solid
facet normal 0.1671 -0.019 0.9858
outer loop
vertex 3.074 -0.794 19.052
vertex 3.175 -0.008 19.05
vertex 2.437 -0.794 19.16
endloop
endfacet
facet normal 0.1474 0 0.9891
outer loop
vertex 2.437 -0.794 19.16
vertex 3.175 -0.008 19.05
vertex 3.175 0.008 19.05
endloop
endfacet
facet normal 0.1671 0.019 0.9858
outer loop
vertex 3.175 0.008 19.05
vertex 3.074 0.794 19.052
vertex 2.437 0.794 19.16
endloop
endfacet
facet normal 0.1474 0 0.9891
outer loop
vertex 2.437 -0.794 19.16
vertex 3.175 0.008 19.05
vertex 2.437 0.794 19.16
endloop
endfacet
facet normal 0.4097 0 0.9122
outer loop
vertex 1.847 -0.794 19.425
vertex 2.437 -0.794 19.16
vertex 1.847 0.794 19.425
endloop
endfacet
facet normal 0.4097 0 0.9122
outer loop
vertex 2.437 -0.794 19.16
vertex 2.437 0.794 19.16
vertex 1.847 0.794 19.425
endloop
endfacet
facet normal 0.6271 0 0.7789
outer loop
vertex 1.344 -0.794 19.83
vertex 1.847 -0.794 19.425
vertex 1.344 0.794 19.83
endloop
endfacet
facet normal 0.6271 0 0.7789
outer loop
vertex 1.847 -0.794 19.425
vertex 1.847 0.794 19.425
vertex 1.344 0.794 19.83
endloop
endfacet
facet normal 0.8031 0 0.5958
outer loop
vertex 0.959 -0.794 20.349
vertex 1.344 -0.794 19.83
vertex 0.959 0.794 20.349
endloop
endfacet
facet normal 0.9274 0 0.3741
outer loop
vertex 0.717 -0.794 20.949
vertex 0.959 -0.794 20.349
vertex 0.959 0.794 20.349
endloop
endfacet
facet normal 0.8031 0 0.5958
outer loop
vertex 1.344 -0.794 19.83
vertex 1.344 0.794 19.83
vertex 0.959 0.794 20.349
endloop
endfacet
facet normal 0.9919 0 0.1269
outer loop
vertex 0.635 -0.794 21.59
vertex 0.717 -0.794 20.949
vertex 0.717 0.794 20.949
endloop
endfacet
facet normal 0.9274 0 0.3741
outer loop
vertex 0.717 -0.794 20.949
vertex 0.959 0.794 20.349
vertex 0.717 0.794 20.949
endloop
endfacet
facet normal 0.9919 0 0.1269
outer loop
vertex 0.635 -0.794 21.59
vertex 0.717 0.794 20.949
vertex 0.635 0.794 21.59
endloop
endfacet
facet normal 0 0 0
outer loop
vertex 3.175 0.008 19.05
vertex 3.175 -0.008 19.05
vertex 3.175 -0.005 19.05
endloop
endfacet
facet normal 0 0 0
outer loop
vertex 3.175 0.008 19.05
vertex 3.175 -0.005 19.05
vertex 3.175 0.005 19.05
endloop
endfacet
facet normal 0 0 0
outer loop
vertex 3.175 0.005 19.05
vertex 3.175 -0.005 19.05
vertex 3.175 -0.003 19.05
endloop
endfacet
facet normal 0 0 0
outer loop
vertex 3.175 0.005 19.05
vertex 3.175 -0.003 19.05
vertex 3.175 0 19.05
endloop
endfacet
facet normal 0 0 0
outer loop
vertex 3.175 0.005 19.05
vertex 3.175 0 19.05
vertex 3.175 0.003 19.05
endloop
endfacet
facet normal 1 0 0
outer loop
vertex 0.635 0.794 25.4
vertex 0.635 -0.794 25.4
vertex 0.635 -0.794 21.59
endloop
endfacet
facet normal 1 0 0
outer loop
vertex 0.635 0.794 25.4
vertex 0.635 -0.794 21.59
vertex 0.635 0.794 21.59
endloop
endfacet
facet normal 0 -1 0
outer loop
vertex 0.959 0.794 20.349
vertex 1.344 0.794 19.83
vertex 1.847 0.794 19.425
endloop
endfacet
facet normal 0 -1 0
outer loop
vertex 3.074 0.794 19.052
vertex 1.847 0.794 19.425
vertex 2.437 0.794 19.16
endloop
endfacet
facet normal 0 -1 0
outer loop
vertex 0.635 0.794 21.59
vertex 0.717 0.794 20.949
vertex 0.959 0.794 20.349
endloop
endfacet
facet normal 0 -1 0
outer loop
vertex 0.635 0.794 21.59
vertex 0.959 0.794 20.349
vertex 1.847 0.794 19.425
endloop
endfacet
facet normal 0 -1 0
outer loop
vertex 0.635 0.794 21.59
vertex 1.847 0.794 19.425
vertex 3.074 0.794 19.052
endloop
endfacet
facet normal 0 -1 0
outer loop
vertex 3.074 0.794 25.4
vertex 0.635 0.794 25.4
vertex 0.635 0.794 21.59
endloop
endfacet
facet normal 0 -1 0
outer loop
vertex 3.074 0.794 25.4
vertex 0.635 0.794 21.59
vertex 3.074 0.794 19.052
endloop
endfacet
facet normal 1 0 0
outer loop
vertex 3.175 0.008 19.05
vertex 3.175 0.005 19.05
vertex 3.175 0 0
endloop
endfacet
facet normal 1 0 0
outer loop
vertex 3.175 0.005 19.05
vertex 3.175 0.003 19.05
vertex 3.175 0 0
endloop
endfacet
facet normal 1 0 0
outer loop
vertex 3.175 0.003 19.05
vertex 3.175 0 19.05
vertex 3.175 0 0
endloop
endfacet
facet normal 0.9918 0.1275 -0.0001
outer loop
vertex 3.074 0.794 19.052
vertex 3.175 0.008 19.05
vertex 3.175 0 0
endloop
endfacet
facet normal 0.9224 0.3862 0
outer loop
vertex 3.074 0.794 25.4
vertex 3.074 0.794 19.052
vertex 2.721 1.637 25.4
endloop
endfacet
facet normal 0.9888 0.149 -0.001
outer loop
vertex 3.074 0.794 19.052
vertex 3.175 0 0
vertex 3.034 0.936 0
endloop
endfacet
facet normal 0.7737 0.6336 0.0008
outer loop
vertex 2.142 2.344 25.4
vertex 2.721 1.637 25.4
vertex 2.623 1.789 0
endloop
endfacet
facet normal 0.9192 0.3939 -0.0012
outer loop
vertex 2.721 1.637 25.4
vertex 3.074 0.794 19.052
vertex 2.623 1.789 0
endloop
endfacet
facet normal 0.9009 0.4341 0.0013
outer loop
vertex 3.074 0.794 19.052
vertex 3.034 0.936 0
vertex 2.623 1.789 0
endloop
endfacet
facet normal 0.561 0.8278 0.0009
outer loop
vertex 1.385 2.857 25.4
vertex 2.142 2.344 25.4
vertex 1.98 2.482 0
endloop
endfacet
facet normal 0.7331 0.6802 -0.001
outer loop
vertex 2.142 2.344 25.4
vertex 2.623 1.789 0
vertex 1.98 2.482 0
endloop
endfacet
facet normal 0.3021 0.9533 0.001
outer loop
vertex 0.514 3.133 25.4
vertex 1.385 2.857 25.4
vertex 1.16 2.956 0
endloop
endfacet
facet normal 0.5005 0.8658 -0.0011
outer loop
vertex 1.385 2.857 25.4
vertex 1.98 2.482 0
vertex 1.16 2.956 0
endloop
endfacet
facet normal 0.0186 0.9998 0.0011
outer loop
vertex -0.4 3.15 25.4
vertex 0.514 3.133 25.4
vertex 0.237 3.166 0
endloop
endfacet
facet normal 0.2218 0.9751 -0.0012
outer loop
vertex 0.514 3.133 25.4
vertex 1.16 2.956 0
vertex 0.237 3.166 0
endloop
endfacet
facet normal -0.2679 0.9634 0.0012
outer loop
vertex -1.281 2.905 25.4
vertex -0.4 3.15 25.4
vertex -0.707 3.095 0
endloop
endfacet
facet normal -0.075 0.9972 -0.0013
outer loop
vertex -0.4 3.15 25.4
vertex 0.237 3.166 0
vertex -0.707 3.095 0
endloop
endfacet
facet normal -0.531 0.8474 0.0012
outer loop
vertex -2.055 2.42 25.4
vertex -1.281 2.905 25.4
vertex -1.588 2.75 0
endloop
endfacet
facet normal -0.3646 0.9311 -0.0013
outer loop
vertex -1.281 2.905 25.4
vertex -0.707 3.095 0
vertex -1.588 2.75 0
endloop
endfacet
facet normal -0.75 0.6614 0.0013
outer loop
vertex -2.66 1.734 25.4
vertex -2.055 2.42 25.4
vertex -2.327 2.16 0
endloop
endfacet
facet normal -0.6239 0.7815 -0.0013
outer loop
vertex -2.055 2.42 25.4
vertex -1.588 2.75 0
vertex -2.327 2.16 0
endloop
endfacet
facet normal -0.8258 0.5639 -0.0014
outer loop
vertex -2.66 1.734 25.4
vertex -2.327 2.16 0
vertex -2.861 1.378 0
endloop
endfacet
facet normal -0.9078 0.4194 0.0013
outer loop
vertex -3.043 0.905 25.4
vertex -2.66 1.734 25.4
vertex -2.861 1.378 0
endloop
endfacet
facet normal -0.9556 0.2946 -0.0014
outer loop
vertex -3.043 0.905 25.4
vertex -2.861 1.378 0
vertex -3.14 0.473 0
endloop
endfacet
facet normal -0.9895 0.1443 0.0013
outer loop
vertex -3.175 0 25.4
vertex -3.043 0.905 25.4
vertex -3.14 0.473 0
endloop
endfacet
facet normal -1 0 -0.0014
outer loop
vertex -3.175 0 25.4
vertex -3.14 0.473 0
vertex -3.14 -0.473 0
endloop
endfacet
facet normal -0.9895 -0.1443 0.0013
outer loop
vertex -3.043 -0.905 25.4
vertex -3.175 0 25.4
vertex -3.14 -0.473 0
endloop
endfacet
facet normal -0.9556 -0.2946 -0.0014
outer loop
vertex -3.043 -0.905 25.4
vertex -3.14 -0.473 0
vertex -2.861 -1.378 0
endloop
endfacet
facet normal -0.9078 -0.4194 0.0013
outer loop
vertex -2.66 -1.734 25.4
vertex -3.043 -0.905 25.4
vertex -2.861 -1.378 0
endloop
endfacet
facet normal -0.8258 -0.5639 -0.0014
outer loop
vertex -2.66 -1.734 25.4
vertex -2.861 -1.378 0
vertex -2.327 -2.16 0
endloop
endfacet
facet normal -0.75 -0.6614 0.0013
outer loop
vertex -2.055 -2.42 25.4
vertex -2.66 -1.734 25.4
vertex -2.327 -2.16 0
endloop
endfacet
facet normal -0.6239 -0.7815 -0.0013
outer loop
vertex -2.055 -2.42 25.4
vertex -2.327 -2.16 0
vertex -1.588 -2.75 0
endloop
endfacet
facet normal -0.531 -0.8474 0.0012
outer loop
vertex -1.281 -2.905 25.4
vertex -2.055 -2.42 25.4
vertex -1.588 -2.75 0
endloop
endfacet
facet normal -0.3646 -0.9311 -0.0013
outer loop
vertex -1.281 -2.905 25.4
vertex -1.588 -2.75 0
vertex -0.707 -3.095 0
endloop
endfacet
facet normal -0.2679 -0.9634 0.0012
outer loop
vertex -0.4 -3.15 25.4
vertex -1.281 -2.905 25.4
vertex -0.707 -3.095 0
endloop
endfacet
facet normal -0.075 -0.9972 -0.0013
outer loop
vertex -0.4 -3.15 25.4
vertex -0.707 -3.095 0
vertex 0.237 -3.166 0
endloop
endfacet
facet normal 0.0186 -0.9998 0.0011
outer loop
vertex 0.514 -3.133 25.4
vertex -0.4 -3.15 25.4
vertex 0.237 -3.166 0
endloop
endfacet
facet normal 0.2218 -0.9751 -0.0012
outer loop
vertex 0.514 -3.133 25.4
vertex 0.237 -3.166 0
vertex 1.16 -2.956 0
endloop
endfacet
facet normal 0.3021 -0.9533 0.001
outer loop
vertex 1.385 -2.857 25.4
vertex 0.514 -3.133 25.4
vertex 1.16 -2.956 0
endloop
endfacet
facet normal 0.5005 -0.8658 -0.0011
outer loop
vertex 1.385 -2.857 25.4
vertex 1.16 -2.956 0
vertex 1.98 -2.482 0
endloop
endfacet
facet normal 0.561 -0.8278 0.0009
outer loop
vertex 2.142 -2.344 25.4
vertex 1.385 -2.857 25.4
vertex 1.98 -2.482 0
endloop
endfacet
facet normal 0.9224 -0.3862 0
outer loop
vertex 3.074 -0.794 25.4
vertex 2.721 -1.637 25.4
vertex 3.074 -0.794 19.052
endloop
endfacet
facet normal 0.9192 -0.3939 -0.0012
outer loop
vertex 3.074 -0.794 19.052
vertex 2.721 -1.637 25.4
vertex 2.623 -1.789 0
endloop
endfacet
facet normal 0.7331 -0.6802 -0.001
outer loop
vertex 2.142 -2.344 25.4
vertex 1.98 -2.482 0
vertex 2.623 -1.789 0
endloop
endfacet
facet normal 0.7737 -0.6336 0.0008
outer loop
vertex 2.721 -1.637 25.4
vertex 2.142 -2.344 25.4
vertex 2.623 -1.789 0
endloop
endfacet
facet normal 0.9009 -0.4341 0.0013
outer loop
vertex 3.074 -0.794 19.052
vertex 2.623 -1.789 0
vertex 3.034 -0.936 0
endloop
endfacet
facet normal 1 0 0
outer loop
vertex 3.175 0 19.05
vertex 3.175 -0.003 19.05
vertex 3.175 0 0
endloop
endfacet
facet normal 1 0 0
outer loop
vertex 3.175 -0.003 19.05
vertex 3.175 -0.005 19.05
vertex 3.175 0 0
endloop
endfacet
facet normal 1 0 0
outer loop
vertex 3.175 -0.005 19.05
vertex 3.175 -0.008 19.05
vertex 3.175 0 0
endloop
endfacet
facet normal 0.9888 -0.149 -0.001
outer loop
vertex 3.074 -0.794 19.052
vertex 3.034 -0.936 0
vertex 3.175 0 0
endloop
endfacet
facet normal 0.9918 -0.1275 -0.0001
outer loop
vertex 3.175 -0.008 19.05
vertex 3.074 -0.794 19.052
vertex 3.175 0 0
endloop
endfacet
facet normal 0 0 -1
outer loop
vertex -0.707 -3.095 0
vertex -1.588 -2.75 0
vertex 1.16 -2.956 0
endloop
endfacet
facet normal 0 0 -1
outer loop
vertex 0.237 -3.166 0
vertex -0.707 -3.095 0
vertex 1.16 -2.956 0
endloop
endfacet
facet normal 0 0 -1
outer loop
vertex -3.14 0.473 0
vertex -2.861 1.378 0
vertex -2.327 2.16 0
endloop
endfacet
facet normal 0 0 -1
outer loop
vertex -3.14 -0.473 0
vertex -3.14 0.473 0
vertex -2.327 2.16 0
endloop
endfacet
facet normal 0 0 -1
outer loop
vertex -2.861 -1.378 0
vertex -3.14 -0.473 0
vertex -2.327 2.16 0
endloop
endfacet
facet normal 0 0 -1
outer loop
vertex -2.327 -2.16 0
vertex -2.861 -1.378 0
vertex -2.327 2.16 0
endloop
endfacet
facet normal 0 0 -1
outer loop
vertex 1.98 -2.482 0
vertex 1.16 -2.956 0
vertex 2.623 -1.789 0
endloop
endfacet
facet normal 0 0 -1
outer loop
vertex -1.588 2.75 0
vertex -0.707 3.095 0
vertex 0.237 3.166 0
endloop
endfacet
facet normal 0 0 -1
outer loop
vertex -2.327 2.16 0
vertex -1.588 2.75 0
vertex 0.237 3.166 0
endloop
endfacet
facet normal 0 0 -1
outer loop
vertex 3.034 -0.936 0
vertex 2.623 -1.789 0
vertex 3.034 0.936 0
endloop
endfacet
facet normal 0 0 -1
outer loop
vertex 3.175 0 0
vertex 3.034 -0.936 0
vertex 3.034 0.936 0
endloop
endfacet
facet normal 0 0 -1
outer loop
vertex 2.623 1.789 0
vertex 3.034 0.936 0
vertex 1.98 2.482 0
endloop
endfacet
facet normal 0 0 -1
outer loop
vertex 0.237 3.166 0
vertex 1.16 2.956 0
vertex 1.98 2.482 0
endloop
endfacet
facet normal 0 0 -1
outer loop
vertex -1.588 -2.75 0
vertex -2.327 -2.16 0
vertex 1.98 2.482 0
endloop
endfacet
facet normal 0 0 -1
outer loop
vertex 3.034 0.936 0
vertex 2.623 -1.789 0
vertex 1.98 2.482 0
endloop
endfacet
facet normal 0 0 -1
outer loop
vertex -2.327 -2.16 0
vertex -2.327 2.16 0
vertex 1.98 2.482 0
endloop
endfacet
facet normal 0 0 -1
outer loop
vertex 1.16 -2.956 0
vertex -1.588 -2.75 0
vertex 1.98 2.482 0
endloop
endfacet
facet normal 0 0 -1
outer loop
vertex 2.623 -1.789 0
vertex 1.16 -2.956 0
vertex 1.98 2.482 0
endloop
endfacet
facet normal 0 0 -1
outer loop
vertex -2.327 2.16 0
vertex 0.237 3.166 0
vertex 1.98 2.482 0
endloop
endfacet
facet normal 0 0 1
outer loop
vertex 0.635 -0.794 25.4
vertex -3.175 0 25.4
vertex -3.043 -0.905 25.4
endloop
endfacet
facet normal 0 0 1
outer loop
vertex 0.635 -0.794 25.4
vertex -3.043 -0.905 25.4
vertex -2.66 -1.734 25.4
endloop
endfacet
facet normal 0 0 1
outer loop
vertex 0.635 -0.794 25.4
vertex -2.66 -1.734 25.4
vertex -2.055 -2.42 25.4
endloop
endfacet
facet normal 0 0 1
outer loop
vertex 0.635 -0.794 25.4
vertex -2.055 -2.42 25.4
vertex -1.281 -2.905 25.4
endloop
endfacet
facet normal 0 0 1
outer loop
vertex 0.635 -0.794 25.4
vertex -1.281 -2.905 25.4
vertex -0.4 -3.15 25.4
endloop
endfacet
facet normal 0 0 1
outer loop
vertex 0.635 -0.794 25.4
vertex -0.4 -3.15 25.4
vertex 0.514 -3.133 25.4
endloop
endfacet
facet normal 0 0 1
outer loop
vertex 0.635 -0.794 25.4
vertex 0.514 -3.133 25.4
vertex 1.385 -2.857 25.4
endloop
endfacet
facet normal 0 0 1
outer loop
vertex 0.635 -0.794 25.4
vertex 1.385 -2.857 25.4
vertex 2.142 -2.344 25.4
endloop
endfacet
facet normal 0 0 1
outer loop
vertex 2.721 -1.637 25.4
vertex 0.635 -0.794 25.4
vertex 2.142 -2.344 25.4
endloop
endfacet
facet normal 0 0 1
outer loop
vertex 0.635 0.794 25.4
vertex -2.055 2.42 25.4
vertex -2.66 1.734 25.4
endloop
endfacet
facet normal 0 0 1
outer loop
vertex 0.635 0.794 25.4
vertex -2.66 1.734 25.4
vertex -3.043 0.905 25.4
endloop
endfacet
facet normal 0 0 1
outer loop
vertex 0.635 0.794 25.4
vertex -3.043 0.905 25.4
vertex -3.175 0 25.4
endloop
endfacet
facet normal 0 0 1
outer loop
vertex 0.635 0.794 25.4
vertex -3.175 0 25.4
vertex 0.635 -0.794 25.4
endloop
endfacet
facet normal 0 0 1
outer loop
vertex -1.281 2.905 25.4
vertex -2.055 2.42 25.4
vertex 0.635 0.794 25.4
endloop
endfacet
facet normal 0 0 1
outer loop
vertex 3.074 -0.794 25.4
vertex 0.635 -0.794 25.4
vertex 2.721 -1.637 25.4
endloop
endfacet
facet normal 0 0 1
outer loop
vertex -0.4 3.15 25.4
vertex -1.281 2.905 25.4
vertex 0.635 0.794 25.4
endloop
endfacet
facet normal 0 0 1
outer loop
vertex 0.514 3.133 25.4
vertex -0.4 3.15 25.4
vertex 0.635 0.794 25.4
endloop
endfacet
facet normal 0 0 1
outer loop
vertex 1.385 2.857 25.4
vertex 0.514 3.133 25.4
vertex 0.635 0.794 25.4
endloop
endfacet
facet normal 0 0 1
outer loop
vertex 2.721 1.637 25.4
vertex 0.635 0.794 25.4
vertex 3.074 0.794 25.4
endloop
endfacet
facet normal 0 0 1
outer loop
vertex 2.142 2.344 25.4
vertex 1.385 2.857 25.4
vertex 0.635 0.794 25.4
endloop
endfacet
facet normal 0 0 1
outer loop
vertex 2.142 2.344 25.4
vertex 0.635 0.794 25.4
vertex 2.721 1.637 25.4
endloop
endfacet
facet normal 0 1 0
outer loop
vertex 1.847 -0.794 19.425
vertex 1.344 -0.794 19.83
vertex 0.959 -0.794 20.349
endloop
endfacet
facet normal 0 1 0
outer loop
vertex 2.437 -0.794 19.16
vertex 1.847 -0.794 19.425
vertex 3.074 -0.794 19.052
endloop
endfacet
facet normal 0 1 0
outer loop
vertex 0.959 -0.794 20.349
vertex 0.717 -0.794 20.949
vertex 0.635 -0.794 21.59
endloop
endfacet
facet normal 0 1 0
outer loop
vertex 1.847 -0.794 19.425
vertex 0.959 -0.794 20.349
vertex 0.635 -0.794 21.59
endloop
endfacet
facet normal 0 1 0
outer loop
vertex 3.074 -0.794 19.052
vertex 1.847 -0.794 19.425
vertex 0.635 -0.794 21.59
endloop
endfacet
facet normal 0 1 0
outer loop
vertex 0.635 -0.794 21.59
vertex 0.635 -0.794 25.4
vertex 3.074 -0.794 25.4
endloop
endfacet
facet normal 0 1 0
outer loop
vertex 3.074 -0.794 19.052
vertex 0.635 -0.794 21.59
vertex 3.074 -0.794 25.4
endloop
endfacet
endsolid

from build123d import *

# Parameters (mm, degrees)
F0_R     = 3.175
F1_DEPTH = 25.4
F2_W     = 2.54
F2_H     = 1.5875
F3_DEPTH = 6.35
F4_R     = 2.53999


# Not quite as in the source:
# - a fillet or chamfer is up to 0.001 mm smaller than in the source, because OpenCascade refuses the exact size


with BuildPart() as f1:
    # F0 (on Top) → F1 (new body)
    with BuildSketch(Plane.XY):
        Circle(F0_R)
    extrude(amount=F1_DEPTH)

    # F2 (on face) → F3 (cut)
    with BuildSketch(Plane.XY.offset(25.4)):
        with Locations((1.905, 0)):
            Rectangle(F2_W, F2_H)
    extrude(amount=-F3_DEPTH, mode=Mode.SUBTRACT)

    # F4 (radius 2.54 in the source; OpenCascade refuses exactly that, so slightly less here)
    f4_edges = [f1.edges().sort_by_distance(p)[0] for p in [
        (0.635, 0, 19.05),
    ]]
    fillet(f4_edges, radius=F4_R)


solid = f1.part
